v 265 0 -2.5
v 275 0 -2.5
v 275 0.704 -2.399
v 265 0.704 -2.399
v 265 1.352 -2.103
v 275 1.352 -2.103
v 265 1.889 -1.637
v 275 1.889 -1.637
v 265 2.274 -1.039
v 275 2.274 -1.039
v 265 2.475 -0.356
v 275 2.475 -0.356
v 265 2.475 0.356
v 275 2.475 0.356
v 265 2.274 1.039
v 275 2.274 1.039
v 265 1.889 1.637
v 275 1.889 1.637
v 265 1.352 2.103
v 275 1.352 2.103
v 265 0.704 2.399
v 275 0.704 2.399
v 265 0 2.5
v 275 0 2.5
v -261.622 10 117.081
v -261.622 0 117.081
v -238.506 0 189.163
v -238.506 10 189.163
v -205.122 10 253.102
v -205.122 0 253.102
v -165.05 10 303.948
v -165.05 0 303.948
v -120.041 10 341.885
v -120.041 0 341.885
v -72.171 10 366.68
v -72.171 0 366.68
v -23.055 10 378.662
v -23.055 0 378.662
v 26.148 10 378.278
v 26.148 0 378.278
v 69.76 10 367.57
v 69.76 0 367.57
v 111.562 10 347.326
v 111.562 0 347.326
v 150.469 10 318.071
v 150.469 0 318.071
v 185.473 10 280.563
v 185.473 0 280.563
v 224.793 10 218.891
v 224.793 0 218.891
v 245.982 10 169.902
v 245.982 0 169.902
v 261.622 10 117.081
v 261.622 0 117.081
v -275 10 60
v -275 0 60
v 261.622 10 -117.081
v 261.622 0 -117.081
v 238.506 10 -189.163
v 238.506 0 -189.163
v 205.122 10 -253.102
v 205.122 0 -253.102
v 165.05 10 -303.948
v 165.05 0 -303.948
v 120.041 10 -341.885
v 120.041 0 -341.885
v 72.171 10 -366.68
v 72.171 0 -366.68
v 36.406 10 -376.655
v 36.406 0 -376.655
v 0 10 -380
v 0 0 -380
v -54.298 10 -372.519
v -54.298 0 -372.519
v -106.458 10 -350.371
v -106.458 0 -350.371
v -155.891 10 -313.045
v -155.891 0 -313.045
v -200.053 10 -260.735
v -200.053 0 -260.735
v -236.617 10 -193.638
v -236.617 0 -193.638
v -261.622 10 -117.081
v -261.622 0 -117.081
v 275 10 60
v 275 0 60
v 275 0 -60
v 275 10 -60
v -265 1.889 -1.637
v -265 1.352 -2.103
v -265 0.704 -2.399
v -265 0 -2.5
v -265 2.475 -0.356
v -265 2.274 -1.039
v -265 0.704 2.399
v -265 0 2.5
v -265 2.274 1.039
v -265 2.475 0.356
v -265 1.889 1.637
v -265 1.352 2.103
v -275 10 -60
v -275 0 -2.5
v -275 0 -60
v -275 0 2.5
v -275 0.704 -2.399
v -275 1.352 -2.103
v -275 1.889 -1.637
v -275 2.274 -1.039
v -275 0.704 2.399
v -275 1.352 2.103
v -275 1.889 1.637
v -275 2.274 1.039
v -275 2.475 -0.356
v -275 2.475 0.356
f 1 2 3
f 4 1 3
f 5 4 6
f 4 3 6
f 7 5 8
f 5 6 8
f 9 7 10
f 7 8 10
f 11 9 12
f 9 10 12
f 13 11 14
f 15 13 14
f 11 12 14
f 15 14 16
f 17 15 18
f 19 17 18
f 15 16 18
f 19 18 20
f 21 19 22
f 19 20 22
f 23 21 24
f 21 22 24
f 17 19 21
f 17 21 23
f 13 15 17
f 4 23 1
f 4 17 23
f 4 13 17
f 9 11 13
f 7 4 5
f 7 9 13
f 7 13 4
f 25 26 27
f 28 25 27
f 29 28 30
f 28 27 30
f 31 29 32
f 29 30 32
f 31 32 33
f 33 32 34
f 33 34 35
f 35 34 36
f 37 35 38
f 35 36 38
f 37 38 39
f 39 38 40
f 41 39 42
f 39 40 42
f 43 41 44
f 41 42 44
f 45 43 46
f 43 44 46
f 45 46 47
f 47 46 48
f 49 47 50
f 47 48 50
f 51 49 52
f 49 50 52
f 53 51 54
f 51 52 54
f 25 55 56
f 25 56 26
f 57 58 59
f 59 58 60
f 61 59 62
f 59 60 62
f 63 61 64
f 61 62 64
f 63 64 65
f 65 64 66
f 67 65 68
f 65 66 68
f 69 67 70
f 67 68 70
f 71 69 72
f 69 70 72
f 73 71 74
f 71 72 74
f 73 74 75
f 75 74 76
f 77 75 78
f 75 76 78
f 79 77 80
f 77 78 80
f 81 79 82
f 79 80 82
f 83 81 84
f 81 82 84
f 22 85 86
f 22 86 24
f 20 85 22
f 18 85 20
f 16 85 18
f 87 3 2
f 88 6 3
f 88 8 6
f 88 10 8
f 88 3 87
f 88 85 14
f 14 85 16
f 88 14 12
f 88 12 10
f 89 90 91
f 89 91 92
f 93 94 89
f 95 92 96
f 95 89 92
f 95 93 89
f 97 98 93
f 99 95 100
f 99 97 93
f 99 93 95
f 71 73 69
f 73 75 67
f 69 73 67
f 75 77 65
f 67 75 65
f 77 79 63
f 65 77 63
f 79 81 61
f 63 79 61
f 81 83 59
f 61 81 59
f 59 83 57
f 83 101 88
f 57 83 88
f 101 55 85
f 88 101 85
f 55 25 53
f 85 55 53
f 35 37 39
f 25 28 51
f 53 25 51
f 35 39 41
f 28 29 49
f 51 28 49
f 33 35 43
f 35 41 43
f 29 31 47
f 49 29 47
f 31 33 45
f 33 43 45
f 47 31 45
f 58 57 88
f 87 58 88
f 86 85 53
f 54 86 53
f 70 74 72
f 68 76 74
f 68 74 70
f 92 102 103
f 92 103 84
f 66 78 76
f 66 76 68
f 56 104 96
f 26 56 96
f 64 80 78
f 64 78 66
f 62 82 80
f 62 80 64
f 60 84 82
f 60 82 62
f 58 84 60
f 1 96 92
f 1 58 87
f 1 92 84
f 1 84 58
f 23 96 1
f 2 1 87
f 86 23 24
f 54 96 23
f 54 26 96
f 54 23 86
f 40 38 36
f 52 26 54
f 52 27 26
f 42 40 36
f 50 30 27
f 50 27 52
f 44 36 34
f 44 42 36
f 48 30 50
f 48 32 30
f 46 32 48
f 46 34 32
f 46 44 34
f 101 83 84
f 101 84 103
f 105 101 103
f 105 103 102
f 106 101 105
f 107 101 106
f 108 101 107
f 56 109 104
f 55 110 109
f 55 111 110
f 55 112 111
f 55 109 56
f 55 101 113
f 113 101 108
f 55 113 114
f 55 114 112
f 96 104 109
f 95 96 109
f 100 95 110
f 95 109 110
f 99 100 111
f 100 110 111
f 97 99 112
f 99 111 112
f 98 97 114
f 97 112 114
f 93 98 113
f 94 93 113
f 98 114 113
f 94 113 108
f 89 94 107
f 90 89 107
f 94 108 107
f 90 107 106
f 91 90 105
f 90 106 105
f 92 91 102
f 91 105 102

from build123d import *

# Parameters (mm, degrees)
SKETCH1_RX          = 380
SKETCH1_RY          = 275
BOSS_EXTRUDE1_DEPTH = 10
BOSS_EXTRUDE2_DEPTH = 10
CUT_EXTRUDE1_DEPTH  = 10
CUT_EXTRUDE2_DEPTH  = 10


with BuildPart() as part:
    # Sketch1 → Boss-Extrude1 (new body)
    with BuildSketch(Plane(origin=(0, 0, 0), x_dir=(1, 0, 0), z_dir=(0, 1, 0))):
        with Locations(Location((0, 0), (0, 0, 90))):
            Ellipse(SKETCH1_RX, SKETCH1_RY)
    extrude(amount=BOSS_EXTRUDE1_DEPTH)

    # Sketch2 → Boss-Extrude2 (add)
    with BuildSketch(Plane(origin=(0, 10, 0), x_dir=(-1, 0, 0), z_dir=(0, 1, 0))):
        Polygon((-261.621621622, -117.081081081), (-275, -60), (-275, 0), (-275, 60), (-261.621621622, 117.081081081), align=None)
        Polygon((261.621621622, 117.081081081), (261.621621622, -117.081081081), (275, -60), (275, 0), (275, 60), align=None)
    extrude(amount=-BOSS_EXTRUDE2_DEPTH)

    # Sketch3 → Cut-Extrude1 (cut)
    with BuildSketch(Plane(origin=(275, 0, 0), x_dir=(0, 0, -1), z_dir=(1, 0, 0))):
        with BuildLine():
            Line((-2.5, 0), (2.5, 0))
            ThreePointArc((2.5, 0), (0, 2.5), (-2.5, 0))
        make_face()
    extrude(amount=-CUT_EXTRUDE1_DEPTH, mode=Mode.SUBTRACT)

    # Sketch4 → Cut-Extrude2 (cut)
    with BuildSketch(Plane.ZY.offset(275)):
        with BuildLine():
            Line((-2.5, 0), (2.5, 0))
            ThreePointArc((2.5, 0), (0, 2.5), (-2.5, 0))
        make_face()
    extrude(amount=-CUT_EXTRUDE2_DEPTH, mode=Mode.SUBTRACT)


solid = part.part
